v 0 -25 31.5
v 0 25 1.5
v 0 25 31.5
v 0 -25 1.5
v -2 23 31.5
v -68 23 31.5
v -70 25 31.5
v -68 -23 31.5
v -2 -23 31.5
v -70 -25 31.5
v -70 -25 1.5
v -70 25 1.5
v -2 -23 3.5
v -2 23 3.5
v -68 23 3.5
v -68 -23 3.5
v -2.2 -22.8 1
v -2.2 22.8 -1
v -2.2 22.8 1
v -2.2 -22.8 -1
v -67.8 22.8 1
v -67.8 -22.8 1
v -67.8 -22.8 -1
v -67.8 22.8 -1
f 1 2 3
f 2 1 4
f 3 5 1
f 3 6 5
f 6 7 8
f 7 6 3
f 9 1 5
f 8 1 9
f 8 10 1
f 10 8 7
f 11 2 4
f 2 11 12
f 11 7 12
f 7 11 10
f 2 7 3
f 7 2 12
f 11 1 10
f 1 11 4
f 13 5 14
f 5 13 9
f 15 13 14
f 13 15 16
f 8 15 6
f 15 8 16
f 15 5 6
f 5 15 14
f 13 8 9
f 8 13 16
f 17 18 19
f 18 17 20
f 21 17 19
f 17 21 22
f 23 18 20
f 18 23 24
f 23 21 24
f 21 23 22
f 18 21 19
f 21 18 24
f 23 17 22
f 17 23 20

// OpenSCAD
// Built by bench/smallmodels/features/compiler.py from a list of features.
$fn = 64;
difference() {
  union() {
    translate([-35, 0, 1.5]) translate([-35, -25, 0]) cube([70, 50, 30]);
  }
  translate([-68, -23, 3.5]) cube([66, 46, 29]);  // shell, wall 2, open top
}
difference() {
  union() {
    translate([-35, 0, -1]) translate([-32.8, -22.8, 0]) cube([65.6, 45.6, 2]);
    translate([-35, 0, 1.5]) translate([-32.8, -22.8, 0]) cube([65.6, 45.6, 4]);
  }
  union() {
    translate([-35, 0, 3.49]) rotate([0, 0, 0]) translate([-35, -25, 0]) cube([70, 50, 2.02]);
  }
}
